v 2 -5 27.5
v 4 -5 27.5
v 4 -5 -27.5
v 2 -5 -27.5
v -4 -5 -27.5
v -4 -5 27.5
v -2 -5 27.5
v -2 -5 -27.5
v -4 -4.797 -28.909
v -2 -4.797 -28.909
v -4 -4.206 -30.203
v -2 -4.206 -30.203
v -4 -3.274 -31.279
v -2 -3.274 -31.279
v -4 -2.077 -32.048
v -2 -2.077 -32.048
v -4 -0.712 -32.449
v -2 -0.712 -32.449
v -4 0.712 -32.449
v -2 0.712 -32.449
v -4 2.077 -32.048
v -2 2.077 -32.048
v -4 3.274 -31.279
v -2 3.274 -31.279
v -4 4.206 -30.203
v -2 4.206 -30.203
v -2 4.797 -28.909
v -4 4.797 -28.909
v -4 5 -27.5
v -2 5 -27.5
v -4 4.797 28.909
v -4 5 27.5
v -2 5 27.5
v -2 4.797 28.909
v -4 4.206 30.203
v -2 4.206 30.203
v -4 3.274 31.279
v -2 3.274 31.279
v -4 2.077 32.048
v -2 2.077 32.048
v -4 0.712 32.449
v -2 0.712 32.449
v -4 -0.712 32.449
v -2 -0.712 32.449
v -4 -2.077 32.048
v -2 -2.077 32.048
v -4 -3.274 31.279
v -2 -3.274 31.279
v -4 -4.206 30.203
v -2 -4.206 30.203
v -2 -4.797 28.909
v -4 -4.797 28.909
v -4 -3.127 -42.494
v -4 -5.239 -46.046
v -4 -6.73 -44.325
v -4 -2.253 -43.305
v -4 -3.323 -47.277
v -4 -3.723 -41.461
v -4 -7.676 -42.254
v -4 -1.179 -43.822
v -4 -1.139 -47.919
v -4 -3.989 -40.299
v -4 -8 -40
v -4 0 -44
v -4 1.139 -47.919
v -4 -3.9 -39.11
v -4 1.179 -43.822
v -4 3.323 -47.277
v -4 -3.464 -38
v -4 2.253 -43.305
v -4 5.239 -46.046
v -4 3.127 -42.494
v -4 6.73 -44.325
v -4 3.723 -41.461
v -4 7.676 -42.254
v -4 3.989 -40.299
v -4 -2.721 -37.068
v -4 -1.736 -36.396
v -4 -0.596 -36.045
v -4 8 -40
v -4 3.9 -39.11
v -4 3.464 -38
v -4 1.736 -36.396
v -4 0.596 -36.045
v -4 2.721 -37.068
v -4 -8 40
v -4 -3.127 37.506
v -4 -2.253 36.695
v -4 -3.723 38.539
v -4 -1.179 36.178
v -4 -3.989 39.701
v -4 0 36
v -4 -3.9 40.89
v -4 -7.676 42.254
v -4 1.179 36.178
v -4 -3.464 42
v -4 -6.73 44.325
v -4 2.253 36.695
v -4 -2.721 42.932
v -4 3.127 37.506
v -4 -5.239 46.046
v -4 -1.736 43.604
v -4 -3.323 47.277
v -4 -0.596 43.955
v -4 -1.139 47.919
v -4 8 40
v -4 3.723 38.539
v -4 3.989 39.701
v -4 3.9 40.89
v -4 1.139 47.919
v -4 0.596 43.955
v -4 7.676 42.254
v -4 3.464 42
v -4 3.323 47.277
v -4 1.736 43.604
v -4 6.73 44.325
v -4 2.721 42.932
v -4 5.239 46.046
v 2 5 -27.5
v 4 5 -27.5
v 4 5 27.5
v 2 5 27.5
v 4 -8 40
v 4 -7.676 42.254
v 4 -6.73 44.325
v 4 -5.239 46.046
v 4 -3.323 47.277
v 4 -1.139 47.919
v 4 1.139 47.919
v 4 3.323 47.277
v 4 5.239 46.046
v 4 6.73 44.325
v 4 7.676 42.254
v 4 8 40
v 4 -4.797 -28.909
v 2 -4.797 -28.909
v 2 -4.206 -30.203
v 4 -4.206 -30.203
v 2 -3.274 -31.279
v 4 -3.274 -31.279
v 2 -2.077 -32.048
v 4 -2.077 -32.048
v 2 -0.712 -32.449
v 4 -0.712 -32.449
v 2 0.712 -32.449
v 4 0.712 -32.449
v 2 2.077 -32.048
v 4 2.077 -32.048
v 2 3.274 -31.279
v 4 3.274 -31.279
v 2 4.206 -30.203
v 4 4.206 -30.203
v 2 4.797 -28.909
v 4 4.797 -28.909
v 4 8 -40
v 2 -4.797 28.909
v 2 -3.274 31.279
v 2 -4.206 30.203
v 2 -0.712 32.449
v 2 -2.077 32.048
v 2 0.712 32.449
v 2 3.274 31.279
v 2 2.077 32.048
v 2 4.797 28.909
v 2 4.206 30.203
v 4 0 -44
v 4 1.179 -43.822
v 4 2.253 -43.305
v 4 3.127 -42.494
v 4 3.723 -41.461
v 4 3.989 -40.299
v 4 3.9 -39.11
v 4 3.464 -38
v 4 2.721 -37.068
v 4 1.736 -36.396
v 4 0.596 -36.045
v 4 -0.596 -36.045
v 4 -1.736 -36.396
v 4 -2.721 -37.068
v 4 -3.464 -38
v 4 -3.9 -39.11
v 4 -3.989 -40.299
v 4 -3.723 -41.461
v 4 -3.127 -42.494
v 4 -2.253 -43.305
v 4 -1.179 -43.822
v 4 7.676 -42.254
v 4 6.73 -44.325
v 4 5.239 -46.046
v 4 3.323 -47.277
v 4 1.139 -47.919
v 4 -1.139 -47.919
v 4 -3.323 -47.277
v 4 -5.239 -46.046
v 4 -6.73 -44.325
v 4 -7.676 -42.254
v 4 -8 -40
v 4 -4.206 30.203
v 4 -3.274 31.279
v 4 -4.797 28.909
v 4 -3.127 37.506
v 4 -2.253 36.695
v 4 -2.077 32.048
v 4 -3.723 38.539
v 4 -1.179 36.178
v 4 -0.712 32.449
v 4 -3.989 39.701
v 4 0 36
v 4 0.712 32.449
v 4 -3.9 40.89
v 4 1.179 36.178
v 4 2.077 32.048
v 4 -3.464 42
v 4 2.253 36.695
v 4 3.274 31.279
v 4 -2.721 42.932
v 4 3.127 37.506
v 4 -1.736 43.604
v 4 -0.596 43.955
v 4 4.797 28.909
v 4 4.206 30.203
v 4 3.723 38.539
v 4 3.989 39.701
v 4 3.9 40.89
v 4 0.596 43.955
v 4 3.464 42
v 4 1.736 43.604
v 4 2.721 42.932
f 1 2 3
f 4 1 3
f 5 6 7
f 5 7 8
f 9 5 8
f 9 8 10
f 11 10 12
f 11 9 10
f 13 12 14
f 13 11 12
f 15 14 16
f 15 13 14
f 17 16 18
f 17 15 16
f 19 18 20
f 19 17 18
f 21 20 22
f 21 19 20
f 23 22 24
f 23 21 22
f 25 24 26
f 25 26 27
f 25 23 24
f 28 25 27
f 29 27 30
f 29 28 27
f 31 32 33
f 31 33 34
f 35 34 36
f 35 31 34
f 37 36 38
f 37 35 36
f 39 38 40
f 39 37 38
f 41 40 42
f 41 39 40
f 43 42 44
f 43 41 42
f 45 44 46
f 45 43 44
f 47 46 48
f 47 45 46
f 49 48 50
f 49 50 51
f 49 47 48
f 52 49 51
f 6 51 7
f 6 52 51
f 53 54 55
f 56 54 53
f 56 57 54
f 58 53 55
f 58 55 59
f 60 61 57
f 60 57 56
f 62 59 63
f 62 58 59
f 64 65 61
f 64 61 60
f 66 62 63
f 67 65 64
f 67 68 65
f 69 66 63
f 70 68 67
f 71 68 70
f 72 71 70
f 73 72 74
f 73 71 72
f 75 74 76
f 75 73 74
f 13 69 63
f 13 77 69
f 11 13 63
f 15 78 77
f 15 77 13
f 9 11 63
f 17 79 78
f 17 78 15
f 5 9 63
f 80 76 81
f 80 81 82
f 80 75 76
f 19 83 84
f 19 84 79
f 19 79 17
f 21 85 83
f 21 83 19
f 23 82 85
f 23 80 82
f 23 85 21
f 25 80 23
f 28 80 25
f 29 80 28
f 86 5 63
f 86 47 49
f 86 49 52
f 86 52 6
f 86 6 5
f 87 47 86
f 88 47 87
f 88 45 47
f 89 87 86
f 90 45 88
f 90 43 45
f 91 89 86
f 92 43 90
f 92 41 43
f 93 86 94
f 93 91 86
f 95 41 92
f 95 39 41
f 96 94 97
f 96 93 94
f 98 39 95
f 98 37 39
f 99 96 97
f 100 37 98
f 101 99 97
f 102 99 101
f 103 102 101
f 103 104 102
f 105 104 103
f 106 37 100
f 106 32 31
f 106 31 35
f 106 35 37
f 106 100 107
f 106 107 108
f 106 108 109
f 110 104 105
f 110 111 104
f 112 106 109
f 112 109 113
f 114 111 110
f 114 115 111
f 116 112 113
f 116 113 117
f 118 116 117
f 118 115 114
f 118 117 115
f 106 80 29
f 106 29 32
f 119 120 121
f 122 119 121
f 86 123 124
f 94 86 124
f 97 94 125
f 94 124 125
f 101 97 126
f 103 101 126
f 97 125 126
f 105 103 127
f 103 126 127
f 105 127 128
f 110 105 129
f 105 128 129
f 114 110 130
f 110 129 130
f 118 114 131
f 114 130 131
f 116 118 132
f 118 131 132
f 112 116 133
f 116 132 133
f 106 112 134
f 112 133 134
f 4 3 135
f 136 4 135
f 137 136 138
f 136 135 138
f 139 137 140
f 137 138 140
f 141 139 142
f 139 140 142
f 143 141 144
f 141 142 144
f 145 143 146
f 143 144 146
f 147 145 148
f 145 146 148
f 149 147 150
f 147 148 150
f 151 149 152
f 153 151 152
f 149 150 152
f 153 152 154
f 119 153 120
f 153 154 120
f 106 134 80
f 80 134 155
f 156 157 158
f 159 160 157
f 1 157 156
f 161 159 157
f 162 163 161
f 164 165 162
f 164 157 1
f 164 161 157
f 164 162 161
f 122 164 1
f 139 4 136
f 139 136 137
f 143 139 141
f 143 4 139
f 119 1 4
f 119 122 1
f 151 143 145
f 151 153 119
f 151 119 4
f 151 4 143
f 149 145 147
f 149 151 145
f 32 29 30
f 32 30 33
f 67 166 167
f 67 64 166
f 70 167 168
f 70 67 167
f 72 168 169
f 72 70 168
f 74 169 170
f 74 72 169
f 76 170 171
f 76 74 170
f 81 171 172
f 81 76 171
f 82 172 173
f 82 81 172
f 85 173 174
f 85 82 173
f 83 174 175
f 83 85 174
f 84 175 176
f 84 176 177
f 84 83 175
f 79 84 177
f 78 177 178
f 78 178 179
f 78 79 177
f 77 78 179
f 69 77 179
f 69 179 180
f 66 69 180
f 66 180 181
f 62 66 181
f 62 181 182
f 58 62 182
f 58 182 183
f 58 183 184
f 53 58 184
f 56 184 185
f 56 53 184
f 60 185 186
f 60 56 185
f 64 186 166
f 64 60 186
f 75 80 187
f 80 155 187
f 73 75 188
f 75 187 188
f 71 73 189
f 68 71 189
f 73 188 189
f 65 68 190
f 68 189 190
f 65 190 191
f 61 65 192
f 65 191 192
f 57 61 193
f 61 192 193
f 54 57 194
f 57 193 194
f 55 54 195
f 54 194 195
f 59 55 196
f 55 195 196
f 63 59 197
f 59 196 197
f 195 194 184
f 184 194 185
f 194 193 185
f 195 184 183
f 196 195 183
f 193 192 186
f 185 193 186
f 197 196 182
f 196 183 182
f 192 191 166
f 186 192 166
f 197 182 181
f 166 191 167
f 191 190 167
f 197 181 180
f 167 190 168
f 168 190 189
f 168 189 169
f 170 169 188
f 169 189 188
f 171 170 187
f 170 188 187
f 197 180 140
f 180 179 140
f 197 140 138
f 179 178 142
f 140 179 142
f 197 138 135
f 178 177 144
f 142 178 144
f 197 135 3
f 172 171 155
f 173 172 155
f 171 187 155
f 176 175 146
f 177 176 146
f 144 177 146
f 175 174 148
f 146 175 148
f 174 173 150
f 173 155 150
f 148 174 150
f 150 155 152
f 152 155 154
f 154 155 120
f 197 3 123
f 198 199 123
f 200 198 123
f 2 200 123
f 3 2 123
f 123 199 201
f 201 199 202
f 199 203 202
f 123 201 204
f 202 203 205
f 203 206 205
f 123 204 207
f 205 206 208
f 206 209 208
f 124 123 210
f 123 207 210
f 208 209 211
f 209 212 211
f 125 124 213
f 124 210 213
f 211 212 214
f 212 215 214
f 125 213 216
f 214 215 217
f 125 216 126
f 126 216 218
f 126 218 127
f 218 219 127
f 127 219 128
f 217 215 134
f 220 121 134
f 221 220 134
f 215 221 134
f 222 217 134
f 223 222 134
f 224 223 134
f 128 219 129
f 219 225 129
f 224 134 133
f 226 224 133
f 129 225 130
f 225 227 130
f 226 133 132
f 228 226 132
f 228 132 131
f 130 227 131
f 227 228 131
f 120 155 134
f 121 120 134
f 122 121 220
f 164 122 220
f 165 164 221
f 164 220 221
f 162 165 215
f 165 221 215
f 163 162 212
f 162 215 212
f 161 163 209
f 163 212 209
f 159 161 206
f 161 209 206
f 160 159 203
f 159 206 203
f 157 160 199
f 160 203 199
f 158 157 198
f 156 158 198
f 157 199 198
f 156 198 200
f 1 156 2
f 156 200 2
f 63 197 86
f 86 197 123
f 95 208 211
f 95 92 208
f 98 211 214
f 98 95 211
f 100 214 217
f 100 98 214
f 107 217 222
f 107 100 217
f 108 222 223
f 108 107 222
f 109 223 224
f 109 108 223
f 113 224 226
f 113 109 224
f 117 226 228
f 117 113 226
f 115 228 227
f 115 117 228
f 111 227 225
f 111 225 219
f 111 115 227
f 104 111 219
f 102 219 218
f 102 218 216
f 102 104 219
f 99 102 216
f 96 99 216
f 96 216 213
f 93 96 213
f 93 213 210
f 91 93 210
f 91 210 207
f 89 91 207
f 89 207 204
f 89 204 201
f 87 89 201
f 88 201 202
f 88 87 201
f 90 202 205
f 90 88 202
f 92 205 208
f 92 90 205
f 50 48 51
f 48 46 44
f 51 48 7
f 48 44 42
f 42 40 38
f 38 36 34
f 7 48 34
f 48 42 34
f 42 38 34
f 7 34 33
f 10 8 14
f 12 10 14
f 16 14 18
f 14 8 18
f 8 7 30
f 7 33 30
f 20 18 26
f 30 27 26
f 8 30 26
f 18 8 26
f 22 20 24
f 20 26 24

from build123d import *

# Parameters (mm, degrees)
SKETCH_1_R          = 4
EXTRUDE_1_DEPTH     = 4
CUT_EXTRUDE_1_DEPTH = 2


with BuildPart() as part:
    # 草图1 → 凸台-拉伸1 (new body, symmetric)
    with BuildSketch(Plane(origin=(0, 0, 0), x_dir=(0, 0, -1), z_dir=(1, 0, 0))):
        with BuildLine():
            Line((-40, 8), (40, 8))
            ThreePointArc((40, 8), (48, 0), (40, -8))
            Line((40, -8), (-40, -8))
            ThreePointArc((-40, -8), (-48, 0), (-40, 8))
        make_face()
        with Locations((40, 0)):
            Circle(SKETCH_1_R, mode=Mode.SUBTRACT)
        with Locations((-40, 0)):
            Circle(SKETCH_1_R, mode=Mode.SUBTRACT)
    extrude(amount=EXTRUDE_1_DEPTH, both=True)

    # 草图7 → 切除-拉伸1 (cut)
    with BuildSketch(Plane.ZY.offset(4)):
        with BuildLine():
            Line((-27.5, 5), (27.5, 5))
            ThreePointArc((27.5, 5), (32.5, 0), (27.5, -5))
            Line((27.5, -5), (-27.5, -5))
            ThreePointArc((-27.5, -5), (-32.5, 0), (-27.5, 5))
        make_face()
    cut_extrude_1 = extrude(amount=-CUT_EXTRUDE_1_DEPTH, mode=Mode.SUBTRACT)

    # 镜向1: 切除-拉伸1 across plane
    add(cut_extrude_1.mirror(Plane(origin=(0, 0, 0), x_dir=(0, 0, 1), z_dir=(1, 0, 0))), mode=Mode.SUBTRACT)


solid = part.part
